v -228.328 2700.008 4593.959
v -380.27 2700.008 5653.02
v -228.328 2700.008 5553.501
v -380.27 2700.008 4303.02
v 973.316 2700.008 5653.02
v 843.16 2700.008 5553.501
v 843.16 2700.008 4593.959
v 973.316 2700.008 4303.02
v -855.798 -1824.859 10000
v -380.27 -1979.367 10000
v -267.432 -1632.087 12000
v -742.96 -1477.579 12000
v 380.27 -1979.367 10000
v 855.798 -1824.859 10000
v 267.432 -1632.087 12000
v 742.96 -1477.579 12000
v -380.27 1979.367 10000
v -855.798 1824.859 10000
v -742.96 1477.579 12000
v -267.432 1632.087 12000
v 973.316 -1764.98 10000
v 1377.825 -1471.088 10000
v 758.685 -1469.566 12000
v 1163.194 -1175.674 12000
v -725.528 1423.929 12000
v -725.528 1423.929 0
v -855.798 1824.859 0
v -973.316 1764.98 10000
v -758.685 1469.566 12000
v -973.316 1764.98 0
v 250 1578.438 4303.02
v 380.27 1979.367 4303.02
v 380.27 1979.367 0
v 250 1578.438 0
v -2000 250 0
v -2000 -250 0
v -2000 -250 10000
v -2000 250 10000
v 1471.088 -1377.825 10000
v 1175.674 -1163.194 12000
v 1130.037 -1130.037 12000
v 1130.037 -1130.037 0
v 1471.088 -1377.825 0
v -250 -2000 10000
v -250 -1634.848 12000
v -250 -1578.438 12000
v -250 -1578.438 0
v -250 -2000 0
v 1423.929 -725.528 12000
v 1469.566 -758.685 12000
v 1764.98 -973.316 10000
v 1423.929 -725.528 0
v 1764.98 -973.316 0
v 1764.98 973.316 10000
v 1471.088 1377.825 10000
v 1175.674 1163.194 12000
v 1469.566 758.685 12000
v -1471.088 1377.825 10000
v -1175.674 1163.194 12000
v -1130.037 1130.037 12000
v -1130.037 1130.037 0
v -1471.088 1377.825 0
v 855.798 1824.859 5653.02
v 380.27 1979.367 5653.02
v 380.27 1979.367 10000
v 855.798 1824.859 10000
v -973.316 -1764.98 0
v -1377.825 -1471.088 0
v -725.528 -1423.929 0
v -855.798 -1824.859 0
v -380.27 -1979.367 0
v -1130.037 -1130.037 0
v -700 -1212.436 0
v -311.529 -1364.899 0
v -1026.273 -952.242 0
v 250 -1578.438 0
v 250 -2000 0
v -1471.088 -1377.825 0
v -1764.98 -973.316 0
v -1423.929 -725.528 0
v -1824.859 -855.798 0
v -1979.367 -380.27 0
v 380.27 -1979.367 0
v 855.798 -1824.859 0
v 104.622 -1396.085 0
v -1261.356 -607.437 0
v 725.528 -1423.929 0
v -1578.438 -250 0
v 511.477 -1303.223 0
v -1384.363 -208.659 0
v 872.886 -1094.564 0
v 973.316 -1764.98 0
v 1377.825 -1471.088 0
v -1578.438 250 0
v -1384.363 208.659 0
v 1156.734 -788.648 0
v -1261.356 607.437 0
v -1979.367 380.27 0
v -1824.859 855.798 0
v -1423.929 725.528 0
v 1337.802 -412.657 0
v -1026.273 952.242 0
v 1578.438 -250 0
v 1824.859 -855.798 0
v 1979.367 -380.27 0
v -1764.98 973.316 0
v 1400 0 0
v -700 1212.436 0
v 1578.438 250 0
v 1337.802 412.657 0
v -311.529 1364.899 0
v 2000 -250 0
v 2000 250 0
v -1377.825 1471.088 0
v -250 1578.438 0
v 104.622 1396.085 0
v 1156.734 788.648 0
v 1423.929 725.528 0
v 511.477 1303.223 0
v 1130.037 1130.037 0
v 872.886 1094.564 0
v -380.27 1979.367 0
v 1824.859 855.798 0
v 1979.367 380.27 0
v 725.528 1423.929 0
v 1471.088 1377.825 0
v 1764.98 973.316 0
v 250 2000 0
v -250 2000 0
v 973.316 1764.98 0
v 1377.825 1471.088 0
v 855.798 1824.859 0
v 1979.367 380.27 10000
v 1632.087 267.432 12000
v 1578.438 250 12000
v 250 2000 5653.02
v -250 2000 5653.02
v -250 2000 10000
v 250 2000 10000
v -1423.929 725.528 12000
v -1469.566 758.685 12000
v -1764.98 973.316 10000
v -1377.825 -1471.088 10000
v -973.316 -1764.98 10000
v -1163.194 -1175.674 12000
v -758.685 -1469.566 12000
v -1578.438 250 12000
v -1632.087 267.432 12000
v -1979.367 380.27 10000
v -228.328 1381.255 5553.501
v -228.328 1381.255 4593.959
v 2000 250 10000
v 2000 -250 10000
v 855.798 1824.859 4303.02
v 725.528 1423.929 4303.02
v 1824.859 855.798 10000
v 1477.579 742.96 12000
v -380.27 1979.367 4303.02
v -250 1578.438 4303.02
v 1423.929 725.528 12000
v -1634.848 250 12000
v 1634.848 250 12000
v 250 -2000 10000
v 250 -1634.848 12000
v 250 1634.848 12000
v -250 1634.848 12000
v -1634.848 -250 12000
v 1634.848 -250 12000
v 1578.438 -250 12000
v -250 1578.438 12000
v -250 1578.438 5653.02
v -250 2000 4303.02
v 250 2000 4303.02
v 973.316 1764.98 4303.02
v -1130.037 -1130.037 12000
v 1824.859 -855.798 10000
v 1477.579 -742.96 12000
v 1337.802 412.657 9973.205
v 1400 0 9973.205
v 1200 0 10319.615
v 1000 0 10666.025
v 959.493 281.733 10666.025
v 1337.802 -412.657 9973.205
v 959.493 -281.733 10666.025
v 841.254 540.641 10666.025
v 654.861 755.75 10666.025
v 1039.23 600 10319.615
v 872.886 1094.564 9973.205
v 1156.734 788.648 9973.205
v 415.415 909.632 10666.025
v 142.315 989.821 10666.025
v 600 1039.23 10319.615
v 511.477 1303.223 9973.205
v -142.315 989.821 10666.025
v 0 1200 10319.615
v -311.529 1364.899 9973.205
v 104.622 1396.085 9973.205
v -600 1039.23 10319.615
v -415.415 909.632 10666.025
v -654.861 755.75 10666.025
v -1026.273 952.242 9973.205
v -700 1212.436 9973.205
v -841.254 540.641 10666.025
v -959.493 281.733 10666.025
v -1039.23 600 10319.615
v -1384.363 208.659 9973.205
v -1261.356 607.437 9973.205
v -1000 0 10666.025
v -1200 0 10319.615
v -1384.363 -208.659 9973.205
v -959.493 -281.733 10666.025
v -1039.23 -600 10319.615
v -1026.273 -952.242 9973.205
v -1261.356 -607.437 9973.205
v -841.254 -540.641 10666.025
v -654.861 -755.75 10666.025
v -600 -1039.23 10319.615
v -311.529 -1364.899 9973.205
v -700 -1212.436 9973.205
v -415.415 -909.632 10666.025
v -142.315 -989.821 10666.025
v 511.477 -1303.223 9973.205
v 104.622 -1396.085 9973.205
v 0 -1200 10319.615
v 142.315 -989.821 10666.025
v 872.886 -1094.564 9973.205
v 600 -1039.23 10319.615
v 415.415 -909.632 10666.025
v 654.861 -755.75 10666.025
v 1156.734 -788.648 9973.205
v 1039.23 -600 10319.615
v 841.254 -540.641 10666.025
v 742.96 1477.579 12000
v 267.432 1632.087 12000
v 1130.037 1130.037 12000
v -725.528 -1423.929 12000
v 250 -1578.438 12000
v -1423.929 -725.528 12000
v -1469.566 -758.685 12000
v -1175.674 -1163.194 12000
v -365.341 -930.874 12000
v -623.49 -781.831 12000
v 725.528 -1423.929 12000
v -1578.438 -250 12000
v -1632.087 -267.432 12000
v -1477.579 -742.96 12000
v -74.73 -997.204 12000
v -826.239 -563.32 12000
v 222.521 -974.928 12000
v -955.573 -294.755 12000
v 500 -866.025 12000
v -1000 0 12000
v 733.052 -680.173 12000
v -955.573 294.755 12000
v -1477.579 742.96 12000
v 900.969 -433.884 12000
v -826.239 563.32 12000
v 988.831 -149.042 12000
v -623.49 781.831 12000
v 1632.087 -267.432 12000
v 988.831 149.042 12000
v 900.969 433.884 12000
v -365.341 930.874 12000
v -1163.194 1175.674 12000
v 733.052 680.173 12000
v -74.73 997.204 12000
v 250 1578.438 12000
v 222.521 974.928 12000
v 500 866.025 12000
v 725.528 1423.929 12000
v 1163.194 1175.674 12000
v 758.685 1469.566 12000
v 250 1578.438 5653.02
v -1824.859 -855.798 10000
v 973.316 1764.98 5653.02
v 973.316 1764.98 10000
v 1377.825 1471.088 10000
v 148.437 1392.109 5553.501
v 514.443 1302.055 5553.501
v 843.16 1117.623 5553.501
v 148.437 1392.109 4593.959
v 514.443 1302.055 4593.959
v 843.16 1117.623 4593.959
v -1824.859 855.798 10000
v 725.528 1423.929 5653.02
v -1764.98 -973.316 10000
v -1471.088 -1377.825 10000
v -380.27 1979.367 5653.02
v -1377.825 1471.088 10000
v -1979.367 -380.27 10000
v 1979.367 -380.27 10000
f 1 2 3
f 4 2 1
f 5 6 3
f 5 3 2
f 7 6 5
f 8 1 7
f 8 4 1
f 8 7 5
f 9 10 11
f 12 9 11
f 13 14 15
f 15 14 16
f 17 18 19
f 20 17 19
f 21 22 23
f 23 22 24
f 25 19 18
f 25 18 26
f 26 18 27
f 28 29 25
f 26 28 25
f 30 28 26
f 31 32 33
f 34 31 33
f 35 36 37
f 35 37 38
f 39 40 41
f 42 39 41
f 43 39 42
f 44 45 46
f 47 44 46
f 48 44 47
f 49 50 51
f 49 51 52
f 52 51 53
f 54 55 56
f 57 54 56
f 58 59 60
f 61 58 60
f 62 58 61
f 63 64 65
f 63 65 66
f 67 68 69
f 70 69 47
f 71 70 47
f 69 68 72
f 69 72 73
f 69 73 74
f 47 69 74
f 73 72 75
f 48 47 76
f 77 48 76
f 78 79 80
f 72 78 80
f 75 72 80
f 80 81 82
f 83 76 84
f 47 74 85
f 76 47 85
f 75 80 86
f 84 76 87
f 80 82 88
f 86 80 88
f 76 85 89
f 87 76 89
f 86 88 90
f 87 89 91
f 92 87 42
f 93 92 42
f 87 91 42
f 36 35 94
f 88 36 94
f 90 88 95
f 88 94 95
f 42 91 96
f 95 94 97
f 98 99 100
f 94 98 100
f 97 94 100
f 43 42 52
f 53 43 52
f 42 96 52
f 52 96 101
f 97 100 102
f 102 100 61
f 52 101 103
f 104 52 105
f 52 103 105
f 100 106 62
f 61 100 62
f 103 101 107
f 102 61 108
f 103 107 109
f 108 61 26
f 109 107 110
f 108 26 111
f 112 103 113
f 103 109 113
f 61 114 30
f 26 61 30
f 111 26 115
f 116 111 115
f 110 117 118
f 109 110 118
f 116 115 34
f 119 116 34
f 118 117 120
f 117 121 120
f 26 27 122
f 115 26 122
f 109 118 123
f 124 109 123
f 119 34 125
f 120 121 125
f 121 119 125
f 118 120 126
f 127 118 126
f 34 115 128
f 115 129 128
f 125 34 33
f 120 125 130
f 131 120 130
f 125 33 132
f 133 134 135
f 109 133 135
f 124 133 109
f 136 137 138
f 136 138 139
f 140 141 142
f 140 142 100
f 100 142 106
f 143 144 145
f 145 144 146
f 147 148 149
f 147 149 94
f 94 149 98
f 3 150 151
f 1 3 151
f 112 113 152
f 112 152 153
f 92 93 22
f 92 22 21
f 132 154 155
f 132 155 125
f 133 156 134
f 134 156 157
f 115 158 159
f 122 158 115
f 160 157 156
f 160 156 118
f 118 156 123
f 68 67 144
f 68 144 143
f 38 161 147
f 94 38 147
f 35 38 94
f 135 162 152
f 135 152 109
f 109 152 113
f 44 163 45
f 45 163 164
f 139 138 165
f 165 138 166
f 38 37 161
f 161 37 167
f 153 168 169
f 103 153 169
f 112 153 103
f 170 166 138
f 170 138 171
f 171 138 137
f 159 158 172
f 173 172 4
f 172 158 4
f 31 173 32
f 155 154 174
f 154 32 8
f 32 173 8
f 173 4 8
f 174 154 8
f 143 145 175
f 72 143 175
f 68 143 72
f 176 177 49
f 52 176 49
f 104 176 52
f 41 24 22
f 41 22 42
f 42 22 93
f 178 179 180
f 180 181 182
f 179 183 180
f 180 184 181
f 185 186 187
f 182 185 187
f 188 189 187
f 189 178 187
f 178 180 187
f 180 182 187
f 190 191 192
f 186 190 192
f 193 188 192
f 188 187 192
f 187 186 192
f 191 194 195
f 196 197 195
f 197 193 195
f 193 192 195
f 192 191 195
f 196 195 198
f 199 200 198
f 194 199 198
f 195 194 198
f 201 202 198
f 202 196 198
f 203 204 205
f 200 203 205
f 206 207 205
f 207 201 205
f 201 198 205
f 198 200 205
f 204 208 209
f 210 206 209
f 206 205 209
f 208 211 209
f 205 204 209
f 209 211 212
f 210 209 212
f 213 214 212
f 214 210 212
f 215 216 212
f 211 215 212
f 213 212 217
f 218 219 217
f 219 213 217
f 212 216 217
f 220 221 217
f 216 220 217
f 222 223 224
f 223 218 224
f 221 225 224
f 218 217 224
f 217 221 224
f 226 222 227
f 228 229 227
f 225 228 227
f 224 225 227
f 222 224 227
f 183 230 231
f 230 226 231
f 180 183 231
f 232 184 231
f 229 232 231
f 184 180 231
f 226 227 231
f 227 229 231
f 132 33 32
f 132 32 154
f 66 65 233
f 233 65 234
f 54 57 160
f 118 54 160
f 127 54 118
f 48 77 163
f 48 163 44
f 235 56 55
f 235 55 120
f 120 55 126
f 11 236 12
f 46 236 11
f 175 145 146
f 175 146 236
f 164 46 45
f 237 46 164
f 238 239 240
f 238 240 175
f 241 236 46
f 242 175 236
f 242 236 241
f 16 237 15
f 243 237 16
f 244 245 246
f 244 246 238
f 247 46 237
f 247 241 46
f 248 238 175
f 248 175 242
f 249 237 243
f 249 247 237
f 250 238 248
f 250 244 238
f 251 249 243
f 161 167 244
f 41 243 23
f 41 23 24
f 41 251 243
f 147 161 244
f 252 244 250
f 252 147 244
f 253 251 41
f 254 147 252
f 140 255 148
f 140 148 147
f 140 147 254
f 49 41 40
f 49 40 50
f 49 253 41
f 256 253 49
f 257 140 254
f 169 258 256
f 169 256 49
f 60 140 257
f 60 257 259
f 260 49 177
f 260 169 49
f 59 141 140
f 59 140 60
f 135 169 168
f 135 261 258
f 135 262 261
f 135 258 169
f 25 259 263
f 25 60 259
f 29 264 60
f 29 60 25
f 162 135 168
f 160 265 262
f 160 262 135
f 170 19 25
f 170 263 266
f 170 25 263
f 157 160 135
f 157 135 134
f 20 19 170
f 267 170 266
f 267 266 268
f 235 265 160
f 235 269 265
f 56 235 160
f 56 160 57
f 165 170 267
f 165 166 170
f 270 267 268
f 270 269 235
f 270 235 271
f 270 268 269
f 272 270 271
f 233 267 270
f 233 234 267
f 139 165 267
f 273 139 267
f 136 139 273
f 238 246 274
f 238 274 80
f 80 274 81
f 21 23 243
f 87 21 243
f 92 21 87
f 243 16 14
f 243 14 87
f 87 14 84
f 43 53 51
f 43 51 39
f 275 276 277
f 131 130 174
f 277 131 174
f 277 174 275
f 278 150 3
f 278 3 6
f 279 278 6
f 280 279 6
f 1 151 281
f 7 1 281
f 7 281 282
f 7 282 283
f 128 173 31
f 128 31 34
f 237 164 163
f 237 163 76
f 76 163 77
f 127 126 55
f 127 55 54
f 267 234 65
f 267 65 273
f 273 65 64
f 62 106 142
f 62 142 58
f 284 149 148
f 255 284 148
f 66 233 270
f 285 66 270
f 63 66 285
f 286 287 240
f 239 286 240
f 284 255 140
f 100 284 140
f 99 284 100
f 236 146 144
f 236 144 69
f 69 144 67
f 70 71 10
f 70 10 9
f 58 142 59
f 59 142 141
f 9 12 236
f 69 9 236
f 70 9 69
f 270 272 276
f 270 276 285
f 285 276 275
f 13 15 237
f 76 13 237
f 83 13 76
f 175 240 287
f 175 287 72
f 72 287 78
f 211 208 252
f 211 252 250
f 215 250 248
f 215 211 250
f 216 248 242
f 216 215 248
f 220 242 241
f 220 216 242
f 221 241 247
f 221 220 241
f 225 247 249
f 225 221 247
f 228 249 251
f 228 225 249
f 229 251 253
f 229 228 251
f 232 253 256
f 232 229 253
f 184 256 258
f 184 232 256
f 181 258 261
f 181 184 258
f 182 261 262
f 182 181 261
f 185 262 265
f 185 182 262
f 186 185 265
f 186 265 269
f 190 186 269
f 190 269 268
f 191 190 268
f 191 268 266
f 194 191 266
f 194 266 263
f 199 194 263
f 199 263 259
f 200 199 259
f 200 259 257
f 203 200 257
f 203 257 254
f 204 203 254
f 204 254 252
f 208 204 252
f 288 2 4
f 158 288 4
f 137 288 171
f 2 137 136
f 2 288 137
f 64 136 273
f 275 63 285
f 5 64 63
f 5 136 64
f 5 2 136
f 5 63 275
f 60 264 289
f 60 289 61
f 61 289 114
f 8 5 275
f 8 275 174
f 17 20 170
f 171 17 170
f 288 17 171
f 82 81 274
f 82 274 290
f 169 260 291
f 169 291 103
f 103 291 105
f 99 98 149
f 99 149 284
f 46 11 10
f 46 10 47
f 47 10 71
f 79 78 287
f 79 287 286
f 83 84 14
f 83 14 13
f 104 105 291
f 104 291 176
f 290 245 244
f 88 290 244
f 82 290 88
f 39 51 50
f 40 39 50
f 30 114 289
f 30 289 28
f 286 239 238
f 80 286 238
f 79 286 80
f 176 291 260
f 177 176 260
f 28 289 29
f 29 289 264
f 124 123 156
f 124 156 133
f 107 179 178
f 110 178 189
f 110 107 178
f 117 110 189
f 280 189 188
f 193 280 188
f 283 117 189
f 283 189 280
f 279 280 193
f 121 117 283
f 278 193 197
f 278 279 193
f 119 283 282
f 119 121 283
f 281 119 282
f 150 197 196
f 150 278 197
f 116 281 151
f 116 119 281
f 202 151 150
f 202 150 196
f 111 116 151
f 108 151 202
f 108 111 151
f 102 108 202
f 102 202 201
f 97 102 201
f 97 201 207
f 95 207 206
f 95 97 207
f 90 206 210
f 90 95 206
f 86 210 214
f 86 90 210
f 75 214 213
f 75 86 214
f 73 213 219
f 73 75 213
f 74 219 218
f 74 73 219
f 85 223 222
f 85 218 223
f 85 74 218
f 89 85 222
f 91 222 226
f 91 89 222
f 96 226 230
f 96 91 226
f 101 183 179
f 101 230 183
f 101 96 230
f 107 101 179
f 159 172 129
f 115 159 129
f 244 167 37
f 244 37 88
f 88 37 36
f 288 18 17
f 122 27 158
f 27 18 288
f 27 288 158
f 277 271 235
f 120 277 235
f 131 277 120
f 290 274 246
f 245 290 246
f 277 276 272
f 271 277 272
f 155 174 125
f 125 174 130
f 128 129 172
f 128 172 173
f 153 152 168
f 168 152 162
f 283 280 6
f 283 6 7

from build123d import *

# Parameters (mm, degrees)
SKETCH1_R                       = 1500
BOSS_EXTRUDE1_DEPTH             = 12000
CHAMFER1_SIZE                   = 2000
CHAMFER1_SIZE2                  = 1154.700538379
SHELL1_T                        = -100
BOSS_EXTRUDE4_REACH             = 12591.678
SKETCH4_W                       = 500
SKETCH4_H                       = 12000
CUT_EXTRUDE1_DEPTH              = 12291.748553282
CIRPATTERN2_COUNT               = 20
SKETCH12_R                      = 1000
CUT_EXTRUDE3_DEPTH              = 12000
SKETCH14_W                      = 1353.586115667
SKETCH14_H                      = 1350
BOSS_EXTRUDE5_DEPTH             = 0.008
BOSS_EXTRUDE5_DIRECTION_2_REACH = 13043.856
CUT_EXTRUDE5_REACH              = 13043.856
CUT_EXTRUDE5_END_RADIUS         = 1400
SKETCH16_W                      = 1071.488727216
SKETCH16_H                      = 959.542143775
CUT_EXTRUDE5_DIRECTION_2_DEPTH  = 13042.855696181


with BuildPart() as part:
    # Sketch1 → Boss-Extrude1 (new body)
    with BuildSketch(Plane.XY):
        Circle(SKETCH1_R)
    extrude(amount=BOSS_EXTRUDE1_DEPTH)

    # Chamfer1
    chamfer1_edges = [part.edges().sort_by_distance(p)[0] for p in [
        (-1500, 0, 12000),
    ]]
    chamfer1_side = [part.faces().sort_by_distance(p)[0] for p in [
        (-1500, 0, 6000),
    ]]
    chamfer(chamfer1_edges, length=CHAMFER1_SIZE, length2=CHAMFER1_SIZE2, reference=chamfer1_side[0])

    # Shell1
    shell1_openings = [part.faces().sort_by_distance(p)[0] for p in [
        (0, 0, 0),
    ]]
    offset(amount=SHELL1_T, openings=shell1_openings, kind=Kind.INTERSECTION)

    # Sketch4 → Boss-Extrude4 (add, up to next)
    with BuildSketch(Plane(origin=(0, 2000, 0), x_dir=(1, 0, 0), z_dir=(0, 1, 0)), mode=Mode.PRIVATE) as boss_extrude4_sk1:
        with Locations((0, -6000)):
            Rectangle(SKETCH4_W, SKETCH4_H)
    boss_extrude4_tool1 = extrude(boss_extrude4_sk1.sketch, amount=-BOSS_EXTRUDE4_REACH, mode=Mode.PRIVATE) - part.part
    boss_extrude4 = boss_extrude4_tool1.solids().sort_by_distance((0, 2000, 6000))[0]
    add(boss_extrude4)

    # Sketch6 → Cut-Extrude1 (cut, symmetric)
    with BuildSketch(Plane.ZY.offset(250)):
        Polygon((10000, 2000), (12000, 1634.848069607), (12000, 2000), align=None)
    cut_extrude1 = extrude(amount=CUT_EXTRUDE1_DEPTH, both=True, mode=Mode.SUBTRACT)

    # CirPattern2: Boss-Extrude4, Cut-Extrude1 ×20 about axis
    cirpattern2_axis = Axis((0, 0, 0), (0, 0, 1))
    add([boss_extrude4.rotate(cirpattern2_axis, i * 360 / CIRPATTERN2_COUNT) for i in range(1, CIRPATTERN2_COUNT)])
    add([cut_extrude1.rotate(cirpattern2_axis, i * 360 / CIRPATTERN2_COUNT) for i in range(1, CIRPATTERN2_COUNT)], mode=Mode.SUBTRACT)

    # Sketch12 → Cut-Extrude3 (cut)
    with BuildSketch(Plane.XY):
        with Locations(Location((0, 0, 0), (0, 0, 180))):
            Circle(SKETCH12_R)
    extrude(amount=CUT_EXTRUDE3_DEPTH, mode=Mode.SUBTRACT)

    # Sketch14 → Boss-Extrude5 (add)
    with BuildSketch(Plane(origin=(0, 2700, 0), x_dir=(1, 0, 0), z_dir=(0, 1, 0))):
        with Locations((296.523198158, -4978.020012277)):
            Rectangle(SKETCH14_W, SKETCH14_H)
    extrude(amount=BOSS_EXTRUDE5_DEPTH)

    # Sketch14 → Boss-Extrude5 direction 2 (add, up to next)
    with BuildSketch(Plane(origin=(0, 2700, 0), x_dir=(1, 0, 0), z_dir=(0, 1, 0)), mode=Mode.PRIVATE) as boss_extrude5_direction_2_sk1:
        with Locations((296.523198158, -4978.020012277)):
            Rectangle(SKETCH14_W, SKETCH14_H)
    boss_extrude5_direction_2_tool1 = extrude(boss_extrude5_direction_2_sk1.sketch, amount=-BOSS_EXTRUDE5_DIRECTION_2_REACH, mode=Mode.PRIVATE) - part.part
    add(boss_extrude5_direction_2_tool1.solids().sort_by_distance((296.523198, 2700, 4978.020012))[0])

    # Cut-Extrude5: up to this cylinder (the profile starts outside it)
    cut_extrude5_end = Plane(origin=(0, 0, 5073.730104), z_dir=(0, 0, -1)) * Cylinder(CUT_EXTRUDE5_END_RADIUS, 28888.712, mode=Mode.PRIVATE)
    # Sketch16 → Cut-Extrude5 (cut, up to the surface)
    with BuildSketch(Plane(origin=(0, 2700, 0), x_dir=(1, 0, 0), z_dir=(0, 1, 0)), mode=Mode.PRIVATE) as cut_extrude5_sk1:
        with Locations((307.415913762, -5073.730104283)):
            Rectangle(SKETCH16_W, SKETCH16_H)
    cut_extrude5_tool1 = extrude(cut_extrude5_sk1.sketch, amount=-CUT_EXTRUDE5_REACH, mode=Mode.PRIVATE) - cut_extrude5_end
    add(cut_extrude5_tool1.solids().sort_by_distance((307.415914, 2700, 5073.730104))[0], mode=Mode.SUBTRACT)

    # Sketch16 → Cut-Extrude5 direction 2 (cut)
    with BuildSketch(Plane(origin=(0, 2700, 0), x_dir=(1, 0, 0), z_dir=(0, 1, 0))):
        with Locations((307.415913762, -5073.730104283)):
            Rectangle(SKETCH16_W, SKETCH16_H)
    extrude(amount=CUT_EXTRUDE5_DIRECTION_2_DEPTH, mode=Mode.SUBTRACT)


solid = part.part
